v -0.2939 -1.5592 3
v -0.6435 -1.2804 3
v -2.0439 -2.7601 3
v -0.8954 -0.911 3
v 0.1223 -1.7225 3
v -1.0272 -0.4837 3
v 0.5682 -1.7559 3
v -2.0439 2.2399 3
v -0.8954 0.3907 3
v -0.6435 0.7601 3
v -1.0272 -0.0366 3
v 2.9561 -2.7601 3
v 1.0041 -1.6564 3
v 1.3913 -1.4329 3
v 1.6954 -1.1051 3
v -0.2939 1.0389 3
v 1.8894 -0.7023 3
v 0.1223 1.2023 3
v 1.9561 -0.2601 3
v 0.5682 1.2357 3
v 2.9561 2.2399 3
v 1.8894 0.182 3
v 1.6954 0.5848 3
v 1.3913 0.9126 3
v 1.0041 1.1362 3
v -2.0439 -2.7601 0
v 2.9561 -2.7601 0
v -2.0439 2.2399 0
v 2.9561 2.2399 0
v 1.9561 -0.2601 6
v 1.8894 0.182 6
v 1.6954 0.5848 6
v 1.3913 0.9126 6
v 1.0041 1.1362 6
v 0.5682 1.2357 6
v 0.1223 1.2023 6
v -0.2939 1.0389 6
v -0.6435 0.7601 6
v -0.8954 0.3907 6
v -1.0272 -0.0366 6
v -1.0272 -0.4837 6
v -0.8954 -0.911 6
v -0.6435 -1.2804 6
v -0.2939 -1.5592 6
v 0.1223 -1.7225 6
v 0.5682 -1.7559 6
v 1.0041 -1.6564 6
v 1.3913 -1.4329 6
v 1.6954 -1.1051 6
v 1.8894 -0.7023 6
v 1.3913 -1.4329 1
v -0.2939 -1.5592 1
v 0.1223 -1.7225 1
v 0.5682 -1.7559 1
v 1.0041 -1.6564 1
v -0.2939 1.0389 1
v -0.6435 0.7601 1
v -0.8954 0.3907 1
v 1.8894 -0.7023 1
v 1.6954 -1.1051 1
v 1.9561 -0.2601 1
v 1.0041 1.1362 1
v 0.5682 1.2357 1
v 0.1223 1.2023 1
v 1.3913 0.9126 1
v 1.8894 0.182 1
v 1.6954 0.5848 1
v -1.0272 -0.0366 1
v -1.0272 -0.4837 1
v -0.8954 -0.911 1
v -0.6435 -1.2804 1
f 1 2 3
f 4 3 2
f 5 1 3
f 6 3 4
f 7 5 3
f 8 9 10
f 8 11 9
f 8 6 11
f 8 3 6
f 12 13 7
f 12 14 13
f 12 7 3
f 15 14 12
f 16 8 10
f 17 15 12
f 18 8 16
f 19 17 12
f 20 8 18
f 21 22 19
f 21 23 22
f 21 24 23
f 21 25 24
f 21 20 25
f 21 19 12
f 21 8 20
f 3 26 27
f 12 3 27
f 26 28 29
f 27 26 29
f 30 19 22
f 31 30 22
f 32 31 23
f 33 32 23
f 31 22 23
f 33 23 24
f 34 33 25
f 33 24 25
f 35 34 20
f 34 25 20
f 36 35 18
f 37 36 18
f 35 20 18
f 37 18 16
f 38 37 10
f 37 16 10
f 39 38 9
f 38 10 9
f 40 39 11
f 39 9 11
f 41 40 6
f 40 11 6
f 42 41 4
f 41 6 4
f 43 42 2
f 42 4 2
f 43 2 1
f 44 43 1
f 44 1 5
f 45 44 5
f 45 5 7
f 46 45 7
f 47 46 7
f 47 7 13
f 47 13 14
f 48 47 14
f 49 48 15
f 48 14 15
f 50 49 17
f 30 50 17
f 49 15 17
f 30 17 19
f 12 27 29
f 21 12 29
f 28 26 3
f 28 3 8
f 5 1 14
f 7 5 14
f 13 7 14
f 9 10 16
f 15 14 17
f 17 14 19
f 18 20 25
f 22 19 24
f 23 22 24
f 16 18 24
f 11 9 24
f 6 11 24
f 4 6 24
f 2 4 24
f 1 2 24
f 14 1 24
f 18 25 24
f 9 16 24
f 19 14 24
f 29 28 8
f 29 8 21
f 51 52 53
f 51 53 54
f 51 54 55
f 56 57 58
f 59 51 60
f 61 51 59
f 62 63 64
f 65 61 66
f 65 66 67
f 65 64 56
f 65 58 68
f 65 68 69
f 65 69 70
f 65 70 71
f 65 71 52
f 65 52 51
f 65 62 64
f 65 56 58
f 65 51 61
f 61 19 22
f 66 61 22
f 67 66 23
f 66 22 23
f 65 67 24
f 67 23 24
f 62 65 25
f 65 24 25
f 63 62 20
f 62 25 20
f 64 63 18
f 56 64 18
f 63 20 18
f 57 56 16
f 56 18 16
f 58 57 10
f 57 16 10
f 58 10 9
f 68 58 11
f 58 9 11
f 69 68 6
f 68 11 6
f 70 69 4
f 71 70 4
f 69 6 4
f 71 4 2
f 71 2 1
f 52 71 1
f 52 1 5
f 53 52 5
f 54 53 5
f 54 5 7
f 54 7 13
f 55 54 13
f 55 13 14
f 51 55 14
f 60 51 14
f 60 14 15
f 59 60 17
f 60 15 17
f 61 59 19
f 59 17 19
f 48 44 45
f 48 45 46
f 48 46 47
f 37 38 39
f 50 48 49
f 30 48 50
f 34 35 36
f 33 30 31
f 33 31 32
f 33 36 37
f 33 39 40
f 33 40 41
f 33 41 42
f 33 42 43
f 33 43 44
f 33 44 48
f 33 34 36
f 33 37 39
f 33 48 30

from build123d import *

# Parameters (mm, degrees)
F0_W     = 5
F0_H     = 5
F1_DEPTH = 3
F2_R     = 1.5
F3_DEPTH = 2
F4_DEPTH = 3


with BuildPart() as f1:
    # F0 (on Top) → F1 (new body)
    with BuildSketch(Plane.XY):
        with Locations((0.45608, -0.260135)):
            Rectangle(F0_W, F0_H)
    extrude(amount=F1_DEPTH)

    # F2 (on face) → F3 (cut)
    with BuildSketch(Plane.XY.offset(3)):
        with Locations((0.45608, -0.260135)):
            Circle(F2_R)
    extrude(amount=-F3_DEPTH, mode=Mode.SUBTRACT)


with BuildPart() as f4:
    # F2 (on face) → F4 (new body)
    with BuildSketch(Plane.XY.offset(3)):
        with Locations((0.45608, -0.260135)):
            Circle(F2_R)
    extrude(amount=F4_DEPTH)


solid = Compound([f1.part, f4.part])
